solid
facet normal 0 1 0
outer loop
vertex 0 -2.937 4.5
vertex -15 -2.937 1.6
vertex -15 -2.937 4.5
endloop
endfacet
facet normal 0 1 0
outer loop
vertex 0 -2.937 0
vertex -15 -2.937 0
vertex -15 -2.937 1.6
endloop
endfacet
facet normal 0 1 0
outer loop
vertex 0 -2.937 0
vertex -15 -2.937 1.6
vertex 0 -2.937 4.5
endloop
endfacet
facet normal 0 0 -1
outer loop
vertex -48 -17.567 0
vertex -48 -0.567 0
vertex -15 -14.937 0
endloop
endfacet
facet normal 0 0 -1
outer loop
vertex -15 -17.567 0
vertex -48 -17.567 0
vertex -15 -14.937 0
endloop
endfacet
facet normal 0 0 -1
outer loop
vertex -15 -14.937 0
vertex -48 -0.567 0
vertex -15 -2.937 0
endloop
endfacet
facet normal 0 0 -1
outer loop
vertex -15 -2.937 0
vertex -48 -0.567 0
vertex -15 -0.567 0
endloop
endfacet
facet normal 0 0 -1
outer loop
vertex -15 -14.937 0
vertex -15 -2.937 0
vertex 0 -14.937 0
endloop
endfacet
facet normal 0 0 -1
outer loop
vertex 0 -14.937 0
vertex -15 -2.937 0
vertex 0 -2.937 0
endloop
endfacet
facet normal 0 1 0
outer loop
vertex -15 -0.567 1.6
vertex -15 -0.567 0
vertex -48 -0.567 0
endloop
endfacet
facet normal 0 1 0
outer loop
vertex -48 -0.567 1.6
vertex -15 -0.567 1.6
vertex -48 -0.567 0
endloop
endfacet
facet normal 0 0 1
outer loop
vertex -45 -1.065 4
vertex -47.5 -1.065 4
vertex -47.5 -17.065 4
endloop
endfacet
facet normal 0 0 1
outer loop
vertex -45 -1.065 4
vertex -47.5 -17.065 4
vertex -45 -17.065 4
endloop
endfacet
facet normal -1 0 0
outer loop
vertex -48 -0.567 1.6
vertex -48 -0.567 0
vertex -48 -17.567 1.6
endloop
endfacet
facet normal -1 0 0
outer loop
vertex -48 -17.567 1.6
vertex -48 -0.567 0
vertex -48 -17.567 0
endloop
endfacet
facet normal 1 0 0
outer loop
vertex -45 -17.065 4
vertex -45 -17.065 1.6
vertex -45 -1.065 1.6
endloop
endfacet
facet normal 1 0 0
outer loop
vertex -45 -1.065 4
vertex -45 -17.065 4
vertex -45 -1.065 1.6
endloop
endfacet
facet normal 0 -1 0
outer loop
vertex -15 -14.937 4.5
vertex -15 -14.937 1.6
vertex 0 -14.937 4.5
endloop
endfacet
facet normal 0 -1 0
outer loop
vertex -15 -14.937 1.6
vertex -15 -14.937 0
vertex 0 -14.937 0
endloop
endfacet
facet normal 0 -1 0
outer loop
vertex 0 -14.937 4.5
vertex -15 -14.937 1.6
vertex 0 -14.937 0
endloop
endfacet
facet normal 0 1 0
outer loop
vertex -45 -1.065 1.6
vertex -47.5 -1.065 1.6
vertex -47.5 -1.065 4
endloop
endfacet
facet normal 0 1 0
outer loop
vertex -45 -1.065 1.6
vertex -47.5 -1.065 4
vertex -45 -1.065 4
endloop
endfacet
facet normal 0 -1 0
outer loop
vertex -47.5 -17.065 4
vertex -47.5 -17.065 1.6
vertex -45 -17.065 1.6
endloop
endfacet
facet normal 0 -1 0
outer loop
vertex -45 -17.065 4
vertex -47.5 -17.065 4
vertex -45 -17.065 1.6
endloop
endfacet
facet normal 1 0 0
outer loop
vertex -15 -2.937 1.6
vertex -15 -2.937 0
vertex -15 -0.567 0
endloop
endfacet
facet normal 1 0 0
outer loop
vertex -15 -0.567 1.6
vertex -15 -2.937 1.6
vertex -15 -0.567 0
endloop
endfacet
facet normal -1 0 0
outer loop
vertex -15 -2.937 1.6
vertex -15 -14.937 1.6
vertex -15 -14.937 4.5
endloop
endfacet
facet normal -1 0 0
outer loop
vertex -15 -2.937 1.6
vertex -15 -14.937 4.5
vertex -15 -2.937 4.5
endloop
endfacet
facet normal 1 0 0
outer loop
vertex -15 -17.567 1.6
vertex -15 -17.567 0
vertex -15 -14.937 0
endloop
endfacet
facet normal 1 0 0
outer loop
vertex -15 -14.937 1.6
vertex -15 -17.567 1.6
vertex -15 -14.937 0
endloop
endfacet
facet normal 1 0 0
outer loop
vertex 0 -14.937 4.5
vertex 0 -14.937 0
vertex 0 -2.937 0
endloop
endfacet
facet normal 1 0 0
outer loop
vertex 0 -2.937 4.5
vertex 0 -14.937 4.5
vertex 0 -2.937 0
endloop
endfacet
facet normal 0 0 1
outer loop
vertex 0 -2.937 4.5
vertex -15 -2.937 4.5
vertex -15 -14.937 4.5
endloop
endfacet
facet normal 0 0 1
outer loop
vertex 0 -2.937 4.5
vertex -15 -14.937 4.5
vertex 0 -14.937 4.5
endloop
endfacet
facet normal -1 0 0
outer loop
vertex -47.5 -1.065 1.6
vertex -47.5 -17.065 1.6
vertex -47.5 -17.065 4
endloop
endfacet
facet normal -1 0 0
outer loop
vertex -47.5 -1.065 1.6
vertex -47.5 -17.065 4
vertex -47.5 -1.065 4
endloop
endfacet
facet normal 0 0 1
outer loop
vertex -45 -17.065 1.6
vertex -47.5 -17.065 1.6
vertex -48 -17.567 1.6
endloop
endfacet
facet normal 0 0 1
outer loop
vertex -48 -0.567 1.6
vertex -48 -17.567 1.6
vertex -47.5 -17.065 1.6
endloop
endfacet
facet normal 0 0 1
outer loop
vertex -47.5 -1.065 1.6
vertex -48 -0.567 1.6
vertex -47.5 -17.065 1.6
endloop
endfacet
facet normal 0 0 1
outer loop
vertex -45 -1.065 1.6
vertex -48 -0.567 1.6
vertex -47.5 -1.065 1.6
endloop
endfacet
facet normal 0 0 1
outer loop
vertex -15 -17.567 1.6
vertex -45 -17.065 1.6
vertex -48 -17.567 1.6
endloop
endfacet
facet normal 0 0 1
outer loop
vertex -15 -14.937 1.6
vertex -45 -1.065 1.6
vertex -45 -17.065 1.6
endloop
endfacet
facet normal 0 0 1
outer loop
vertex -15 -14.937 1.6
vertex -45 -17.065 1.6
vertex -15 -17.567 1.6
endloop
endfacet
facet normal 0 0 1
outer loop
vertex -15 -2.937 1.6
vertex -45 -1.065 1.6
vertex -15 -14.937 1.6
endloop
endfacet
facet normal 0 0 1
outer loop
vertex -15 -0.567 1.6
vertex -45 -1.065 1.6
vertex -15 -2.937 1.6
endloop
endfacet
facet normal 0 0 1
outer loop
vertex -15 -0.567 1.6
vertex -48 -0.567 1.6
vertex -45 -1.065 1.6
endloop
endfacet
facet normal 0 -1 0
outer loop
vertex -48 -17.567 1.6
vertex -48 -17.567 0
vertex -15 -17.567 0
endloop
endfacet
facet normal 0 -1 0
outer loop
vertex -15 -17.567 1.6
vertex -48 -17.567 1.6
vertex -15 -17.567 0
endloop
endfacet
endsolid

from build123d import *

# Parameters (mm, degrees)
F1_DEPTH = 1.6
F0_W     = 15
F0_H     = 12
F2_DEPTH = 4.5
F3_W     = 2.5
F3_H     = 16
F4_DEPTH = 2.4


with BuildPart() as f1:
    # F0 (on Top) → F1 (new body)
    with BuildSketch(Plane.XY):
        Polygon((-15, -0.567309), (-48, -0.567309), (-48, -17.567309), (-15, -17.567309), (-15, -14.936926), (-15, -2.936926), align=None)
    extrude(amount=F1_DEPTH)

    # F0 (on Top) → F2 (join)
    with BuildSketch(Plane.XY):
        with Locations((-7.5, -8.936926)):
            Rectangle(F0_W, F0_H)
    extrude(amount=F2_DEPTH)

    # F3 (on face) → F4 (join)
    with BuildSketch(Plane.XY.offset(1.6)):
        with Locations((-46.25, -9.064941)):
            Rectangle(F3_W, F3_H)
    extrude(amount=F4_DEPTH)


solid = f1.part
